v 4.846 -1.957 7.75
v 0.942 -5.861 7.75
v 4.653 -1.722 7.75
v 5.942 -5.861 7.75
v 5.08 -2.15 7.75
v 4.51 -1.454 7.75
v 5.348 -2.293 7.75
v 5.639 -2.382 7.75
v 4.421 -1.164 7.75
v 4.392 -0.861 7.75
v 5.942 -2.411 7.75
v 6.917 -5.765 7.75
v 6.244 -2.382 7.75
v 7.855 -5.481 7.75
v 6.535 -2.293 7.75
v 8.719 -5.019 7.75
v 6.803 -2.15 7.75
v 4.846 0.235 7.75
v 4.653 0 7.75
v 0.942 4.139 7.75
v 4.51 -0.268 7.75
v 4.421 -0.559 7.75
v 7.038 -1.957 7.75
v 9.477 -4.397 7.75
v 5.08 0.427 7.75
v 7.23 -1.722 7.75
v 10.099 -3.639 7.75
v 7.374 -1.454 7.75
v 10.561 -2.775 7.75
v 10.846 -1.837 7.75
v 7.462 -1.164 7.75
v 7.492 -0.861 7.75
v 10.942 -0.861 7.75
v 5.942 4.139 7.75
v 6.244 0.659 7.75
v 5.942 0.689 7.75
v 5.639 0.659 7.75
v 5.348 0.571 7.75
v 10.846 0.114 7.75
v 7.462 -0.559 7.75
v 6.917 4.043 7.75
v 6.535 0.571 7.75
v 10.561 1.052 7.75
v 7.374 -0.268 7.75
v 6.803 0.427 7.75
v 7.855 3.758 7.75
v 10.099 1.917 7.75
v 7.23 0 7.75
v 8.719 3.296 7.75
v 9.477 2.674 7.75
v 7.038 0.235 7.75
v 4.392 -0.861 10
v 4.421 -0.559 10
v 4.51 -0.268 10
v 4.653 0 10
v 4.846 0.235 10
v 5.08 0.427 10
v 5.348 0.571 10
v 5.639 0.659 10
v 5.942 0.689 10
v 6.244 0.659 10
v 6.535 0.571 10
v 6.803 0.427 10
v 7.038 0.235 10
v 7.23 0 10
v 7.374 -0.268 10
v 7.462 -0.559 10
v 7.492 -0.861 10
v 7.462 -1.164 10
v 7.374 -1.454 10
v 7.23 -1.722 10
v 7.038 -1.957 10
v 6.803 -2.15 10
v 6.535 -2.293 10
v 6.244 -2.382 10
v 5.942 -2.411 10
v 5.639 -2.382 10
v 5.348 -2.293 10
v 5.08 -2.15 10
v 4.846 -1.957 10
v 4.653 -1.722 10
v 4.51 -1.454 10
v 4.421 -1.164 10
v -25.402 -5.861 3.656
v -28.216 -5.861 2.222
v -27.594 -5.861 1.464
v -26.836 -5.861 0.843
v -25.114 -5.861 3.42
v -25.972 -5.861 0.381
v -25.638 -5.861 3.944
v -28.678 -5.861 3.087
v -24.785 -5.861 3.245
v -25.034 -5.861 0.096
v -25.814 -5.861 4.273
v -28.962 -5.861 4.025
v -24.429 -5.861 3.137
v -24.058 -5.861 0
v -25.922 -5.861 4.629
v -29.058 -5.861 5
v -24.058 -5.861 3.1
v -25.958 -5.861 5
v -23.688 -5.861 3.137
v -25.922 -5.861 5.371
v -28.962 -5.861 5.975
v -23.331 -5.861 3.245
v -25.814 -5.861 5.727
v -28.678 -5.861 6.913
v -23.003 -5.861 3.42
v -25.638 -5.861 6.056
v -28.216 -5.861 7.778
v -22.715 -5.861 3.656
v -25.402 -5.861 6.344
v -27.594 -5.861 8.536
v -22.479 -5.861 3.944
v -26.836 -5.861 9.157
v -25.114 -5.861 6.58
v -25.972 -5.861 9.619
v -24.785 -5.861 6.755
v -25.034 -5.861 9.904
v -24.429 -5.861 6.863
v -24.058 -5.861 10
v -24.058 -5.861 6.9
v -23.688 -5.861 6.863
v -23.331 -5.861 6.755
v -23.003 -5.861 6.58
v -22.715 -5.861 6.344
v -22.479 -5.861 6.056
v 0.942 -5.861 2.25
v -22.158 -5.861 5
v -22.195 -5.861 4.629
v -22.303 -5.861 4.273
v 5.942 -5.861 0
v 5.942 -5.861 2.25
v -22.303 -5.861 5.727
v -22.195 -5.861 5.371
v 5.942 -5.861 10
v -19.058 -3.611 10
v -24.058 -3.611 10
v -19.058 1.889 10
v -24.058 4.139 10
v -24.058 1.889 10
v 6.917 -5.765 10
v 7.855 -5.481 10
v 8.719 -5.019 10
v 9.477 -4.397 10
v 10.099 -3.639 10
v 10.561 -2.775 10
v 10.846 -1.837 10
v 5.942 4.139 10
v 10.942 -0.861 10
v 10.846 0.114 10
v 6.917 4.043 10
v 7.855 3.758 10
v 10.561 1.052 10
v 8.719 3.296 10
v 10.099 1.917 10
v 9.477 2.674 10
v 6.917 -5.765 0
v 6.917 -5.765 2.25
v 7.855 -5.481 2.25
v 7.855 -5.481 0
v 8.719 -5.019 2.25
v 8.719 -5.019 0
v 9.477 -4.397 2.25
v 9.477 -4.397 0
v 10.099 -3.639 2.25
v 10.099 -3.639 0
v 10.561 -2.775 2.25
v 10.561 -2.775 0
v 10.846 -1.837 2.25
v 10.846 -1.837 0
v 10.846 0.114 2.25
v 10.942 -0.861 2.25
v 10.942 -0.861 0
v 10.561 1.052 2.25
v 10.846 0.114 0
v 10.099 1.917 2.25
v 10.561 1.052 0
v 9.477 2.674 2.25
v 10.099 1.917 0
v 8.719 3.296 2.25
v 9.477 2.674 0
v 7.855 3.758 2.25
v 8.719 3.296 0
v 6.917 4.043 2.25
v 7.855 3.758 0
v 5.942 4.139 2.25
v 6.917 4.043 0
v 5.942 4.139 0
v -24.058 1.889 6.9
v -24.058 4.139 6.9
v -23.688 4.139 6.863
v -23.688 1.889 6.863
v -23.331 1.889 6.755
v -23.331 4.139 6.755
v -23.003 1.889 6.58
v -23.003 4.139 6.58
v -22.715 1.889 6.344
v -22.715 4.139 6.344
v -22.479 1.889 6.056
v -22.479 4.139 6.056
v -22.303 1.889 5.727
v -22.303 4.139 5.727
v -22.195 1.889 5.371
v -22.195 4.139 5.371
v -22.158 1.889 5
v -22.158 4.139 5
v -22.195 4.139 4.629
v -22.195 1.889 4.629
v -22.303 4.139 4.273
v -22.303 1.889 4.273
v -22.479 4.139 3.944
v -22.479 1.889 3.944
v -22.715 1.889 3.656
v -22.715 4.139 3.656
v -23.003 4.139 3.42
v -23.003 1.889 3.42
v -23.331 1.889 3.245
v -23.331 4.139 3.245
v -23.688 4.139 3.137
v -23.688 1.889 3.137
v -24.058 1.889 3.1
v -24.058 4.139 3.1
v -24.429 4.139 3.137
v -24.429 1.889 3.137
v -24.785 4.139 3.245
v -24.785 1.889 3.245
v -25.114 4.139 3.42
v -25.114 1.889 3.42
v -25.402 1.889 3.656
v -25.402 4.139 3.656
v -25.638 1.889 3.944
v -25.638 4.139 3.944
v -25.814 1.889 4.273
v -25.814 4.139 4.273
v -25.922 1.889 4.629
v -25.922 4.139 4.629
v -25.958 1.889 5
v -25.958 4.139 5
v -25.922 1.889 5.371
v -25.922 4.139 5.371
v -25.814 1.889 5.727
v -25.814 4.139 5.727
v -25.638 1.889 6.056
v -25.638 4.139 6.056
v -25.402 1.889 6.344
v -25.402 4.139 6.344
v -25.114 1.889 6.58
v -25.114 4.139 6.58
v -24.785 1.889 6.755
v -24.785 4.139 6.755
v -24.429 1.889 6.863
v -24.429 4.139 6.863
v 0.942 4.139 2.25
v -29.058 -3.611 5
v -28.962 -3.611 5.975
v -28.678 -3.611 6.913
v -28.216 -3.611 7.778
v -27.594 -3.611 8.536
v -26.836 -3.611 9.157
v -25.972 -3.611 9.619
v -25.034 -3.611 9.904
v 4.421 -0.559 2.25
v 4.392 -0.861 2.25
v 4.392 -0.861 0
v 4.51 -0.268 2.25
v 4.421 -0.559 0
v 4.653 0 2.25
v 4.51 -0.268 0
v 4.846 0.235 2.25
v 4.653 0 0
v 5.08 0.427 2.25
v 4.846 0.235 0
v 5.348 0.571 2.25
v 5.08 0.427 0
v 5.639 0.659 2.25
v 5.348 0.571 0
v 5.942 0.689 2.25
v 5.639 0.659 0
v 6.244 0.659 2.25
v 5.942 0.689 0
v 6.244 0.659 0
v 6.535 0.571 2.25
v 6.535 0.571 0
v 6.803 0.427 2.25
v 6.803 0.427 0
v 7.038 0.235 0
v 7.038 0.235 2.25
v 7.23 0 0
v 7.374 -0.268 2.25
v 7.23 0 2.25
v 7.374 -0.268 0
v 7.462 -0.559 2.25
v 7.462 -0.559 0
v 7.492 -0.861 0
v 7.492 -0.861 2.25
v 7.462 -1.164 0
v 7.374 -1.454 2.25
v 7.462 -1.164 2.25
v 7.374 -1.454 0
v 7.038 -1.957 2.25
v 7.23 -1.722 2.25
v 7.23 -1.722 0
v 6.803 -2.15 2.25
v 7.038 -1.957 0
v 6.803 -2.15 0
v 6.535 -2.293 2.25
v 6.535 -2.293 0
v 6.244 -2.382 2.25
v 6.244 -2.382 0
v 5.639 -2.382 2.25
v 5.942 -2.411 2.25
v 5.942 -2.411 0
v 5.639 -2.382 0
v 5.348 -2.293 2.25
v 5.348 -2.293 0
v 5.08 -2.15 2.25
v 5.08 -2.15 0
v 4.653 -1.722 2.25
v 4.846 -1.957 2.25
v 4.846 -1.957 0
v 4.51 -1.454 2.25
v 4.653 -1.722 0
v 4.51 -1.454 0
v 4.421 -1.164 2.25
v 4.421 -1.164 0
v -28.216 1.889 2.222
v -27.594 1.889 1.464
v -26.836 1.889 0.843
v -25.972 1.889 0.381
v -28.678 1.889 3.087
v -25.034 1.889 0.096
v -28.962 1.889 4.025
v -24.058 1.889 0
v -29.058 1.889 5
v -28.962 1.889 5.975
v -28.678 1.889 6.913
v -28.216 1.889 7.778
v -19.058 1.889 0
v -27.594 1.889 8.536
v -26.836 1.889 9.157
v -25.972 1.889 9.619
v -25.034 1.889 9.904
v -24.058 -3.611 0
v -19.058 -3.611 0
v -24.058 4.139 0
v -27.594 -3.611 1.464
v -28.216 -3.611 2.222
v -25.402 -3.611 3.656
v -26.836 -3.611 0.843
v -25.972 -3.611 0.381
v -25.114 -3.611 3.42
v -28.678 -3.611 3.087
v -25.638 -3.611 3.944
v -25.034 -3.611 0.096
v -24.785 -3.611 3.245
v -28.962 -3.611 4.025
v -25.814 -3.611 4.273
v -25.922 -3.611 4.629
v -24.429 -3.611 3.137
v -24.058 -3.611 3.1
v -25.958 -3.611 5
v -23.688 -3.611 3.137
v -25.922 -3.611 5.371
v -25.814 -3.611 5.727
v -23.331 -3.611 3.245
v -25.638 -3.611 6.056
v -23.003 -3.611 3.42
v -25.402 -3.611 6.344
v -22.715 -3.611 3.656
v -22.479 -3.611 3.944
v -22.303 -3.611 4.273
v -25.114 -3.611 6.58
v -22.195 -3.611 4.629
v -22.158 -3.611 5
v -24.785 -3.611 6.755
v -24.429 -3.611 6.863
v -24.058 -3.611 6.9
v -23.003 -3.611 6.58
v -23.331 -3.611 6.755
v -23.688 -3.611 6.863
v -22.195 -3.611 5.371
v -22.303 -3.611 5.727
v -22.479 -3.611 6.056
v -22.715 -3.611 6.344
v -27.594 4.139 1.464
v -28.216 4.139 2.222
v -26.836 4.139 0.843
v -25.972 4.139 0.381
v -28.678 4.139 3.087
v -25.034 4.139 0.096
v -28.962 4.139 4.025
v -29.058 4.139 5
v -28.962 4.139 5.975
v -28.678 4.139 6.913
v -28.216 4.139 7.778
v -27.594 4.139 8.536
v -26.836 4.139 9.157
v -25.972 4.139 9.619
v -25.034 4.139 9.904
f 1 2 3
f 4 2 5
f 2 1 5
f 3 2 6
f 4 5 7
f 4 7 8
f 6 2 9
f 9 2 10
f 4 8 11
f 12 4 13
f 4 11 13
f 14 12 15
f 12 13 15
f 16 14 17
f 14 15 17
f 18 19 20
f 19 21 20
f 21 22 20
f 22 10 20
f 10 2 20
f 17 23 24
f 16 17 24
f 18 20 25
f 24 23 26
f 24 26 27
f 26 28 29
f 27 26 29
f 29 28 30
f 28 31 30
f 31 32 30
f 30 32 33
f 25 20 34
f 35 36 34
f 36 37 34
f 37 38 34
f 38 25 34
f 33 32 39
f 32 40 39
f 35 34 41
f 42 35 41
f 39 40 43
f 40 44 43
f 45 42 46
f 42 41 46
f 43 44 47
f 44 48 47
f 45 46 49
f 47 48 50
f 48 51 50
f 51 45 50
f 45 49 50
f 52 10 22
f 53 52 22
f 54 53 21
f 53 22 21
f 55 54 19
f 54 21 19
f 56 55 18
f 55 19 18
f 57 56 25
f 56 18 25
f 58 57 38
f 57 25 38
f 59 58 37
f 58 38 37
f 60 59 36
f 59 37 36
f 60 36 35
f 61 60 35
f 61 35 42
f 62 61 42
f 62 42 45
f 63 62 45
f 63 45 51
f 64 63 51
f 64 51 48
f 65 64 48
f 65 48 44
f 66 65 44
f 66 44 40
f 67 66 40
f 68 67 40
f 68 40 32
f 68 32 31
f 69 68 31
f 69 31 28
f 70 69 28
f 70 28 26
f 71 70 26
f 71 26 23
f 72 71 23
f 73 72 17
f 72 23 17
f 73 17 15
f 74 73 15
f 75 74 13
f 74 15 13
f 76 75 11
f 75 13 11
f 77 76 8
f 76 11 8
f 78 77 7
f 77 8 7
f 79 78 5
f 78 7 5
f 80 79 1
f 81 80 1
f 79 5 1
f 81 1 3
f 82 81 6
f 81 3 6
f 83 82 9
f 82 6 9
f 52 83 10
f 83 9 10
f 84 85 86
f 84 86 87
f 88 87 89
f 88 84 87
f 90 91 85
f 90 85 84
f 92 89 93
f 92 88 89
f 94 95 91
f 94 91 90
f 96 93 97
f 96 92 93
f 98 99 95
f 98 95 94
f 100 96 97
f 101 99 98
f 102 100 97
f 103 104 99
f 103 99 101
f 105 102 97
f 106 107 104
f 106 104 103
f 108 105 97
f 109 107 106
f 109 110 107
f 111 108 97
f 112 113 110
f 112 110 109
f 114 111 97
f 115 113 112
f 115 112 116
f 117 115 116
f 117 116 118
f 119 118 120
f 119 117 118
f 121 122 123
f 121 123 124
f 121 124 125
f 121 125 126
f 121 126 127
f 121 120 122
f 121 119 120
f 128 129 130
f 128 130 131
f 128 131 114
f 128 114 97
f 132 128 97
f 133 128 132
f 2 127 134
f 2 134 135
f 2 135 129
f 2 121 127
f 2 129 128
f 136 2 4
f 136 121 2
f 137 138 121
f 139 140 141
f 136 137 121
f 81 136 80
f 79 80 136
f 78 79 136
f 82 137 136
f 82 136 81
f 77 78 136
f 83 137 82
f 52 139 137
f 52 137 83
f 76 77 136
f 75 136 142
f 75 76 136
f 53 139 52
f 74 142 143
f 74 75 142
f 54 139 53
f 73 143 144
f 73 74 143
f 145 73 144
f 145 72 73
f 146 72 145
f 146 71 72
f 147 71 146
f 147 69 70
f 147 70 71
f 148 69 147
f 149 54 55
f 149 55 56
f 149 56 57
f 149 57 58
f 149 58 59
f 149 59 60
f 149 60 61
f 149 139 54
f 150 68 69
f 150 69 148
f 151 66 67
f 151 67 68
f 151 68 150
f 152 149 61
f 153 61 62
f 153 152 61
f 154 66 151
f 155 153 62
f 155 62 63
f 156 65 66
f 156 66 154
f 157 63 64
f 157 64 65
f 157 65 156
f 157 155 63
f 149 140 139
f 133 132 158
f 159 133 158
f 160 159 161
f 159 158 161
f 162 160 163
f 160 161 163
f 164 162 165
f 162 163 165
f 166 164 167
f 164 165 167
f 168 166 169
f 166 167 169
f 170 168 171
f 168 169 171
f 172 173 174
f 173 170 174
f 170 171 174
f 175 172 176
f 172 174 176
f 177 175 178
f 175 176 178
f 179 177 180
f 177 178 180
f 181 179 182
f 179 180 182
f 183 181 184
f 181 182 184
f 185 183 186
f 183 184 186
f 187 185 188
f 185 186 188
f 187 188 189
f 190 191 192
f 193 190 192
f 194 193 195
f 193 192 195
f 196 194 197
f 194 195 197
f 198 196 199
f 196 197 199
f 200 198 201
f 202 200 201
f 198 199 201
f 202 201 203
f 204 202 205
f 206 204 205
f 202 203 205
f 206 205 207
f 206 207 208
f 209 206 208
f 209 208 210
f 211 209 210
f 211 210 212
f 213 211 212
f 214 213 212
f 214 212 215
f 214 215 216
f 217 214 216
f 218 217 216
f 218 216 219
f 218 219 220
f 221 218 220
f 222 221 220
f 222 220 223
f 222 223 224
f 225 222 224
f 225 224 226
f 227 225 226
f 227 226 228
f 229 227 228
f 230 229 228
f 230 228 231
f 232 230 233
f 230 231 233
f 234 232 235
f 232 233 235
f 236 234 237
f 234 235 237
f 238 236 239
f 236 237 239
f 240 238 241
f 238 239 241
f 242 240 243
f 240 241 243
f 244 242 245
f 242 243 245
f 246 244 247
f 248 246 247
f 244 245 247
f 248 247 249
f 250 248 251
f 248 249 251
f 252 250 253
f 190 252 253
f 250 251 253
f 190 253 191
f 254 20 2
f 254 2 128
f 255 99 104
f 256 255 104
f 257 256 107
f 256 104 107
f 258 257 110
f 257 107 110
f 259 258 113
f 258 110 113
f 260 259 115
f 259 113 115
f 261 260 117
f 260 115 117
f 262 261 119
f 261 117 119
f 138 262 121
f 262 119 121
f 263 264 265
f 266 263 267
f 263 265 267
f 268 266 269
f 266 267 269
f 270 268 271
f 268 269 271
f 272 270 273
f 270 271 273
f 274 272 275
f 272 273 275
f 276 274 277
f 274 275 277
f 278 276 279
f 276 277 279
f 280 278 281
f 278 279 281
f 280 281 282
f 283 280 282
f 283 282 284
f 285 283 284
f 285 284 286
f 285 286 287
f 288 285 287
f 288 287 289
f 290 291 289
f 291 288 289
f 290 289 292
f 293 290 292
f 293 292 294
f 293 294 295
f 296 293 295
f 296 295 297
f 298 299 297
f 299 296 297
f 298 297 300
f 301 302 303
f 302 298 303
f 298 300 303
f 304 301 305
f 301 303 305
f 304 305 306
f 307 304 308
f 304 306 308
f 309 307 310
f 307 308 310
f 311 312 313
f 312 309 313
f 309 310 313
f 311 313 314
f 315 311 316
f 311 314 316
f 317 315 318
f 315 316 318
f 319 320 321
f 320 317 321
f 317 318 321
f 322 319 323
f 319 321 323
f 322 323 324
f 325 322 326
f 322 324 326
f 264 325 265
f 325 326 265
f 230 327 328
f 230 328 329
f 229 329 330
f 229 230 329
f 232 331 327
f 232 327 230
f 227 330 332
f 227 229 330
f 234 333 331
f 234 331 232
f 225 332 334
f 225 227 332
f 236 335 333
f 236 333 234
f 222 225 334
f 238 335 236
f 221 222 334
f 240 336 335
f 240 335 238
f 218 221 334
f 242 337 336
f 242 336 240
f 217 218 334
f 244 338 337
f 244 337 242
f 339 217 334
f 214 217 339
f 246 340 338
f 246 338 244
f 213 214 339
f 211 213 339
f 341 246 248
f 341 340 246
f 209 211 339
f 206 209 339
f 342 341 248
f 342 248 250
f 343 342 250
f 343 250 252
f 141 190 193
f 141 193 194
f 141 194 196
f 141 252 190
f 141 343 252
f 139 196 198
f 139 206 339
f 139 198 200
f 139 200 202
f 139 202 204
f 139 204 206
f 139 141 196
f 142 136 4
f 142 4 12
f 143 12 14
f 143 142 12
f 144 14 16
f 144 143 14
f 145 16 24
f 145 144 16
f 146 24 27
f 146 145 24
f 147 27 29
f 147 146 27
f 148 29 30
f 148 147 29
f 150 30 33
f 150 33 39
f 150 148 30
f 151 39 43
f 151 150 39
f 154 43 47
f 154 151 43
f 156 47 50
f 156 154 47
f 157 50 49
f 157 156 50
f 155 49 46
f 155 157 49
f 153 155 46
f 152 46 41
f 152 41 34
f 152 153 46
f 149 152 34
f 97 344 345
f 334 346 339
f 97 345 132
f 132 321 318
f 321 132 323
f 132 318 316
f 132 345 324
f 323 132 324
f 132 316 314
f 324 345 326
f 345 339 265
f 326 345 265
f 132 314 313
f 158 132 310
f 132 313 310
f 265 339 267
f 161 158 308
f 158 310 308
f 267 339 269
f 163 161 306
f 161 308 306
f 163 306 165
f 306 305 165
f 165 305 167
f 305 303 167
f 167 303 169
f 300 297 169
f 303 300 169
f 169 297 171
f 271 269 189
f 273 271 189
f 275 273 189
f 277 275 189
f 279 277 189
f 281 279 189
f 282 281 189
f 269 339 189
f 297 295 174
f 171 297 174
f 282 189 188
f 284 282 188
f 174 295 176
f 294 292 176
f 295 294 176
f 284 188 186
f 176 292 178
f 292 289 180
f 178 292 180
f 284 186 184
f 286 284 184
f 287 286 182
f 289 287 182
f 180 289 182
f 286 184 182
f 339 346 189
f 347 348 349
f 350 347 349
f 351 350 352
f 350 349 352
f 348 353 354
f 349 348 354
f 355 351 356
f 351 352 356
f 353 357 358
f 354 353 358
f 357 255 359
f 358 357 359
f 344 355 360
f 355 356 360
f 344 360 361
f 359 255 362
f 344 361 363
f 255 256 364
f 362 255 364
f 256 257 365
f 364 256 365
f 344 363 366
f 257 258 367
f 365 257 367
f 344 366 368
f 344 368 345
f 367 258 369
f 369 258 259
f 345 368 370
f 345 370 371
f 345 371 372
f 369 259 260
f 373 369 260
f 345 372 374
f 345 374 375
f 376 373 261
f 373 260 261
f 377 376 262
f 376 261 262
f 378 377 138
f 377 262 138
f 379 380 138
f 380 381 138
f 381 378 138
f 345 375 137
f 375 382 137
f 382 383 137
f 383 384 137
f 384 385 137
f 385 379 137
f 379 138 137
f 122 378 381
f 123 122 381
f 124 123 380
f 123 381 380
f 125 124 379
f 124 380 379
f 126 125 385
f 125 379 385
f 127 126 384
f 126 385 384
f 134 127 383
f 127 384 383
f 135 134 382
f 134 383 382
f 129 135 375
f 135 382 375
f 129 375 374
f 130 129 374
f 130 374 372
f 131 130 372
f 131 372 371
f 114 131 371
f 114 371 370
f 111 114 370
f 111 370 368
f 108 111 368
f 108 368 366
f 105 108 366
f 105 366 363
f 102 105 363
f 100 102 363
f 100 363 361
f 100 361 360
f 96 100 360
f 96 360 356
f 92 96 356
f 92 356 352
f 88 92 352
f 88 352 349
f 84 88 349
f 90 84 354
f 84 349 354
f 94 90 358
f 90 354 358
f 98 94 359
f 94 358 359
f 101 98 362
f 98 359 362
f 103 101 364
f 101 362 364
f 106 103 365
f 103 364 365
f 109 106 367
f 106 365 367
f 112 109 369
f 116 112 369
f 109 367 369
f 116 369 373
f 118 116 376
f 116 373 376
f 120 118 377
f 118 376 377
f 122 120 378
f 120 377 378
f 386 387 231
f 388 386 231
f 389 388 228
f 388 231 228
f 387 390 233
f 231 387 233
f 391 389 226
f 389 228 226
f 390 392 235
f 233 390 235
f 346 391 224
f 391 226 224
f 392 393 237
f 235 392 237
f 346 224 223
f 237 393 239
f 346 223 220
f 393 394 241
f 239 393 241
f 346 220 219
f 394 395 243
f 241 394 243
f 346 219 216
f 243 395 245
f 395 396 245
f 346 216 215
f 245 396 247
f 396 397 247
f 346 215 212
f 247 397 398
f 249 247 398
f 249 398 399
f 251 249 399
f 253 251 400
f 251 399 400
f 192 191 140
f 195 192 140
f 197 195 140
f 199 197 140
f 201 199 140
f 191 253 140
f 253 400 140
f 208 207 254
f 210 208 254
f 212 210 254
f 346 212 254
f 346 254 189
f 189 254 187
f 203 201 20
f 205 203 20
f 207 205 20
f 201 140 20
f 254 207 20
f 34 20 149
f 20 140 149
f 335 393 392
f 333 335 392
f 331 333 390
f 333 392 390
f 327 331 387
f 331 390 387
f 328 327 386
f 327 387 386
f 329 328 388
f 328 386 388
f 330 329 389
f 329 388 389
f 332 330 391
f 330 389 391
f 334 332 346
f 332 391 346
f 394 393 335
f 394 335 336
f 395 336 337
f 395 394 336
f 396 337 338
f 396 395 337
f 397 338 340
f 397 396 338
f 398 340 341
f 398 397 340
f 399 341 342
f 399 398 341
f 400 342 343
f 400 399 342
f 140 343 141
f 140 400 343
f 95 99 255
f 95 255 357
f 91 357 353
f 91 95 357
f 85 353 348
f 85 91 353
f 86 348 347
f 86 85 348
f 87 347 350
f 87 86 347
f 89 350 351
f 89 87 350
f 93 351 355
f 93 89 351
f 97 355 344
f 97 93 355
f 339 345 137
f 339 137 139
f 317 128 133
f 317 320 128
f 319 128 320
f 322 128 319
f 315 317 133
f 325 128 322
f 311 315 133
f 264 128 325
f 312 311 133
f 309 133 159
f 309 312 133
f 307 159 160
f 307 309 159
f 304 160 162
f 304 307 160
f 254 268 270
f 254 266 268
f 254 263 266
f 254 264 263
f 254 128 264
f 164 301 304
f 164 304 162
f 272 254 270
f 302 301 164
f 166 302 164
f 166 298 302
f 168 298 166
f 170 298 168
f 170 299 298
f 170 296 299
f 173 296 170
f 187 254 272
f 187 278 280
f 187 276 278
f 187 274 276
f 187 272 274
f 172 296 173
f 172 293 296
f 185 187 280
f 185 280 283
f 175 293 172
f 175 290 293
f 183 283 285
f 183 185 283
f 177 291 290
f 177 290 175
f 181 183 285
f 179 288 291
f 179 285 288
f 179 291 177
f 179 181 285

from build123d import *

# Parameters (mm, degrees)
SKETCH1_W            = 30
SKETCH1_H            = 10
BOSS_EXTRUDE1_DEPTH  = 10
SKETCH2_R            = 5
BOSS_EXTRUDE2_DEPTH  = 2.25
BOSS_EXTRUDE4_DEPTH  = 2.25
MIRROR4_COPY_1_DEPTH = 2.25
MIRROR4_COPY_2_DEPTH = 2.25
SKETCH4_R            = 1.9
CUT_EXTRUDE1_DEPTH   = 13.25
SKETCH5_R            = 1.55
CUT_EXTRUDE2_DEPTH   = 13.25
SKETCH6_W            = 5
SKETCH6_H            = 5.5
CUT_EXTRUDE3_DEPTH   = 13.25
SKETCH7_W            = 5
SKETCH7_H            = 5.5
CUT_EXTRUDE4_DEPTH   = 13.25


with BuildPart() as part:
    # Sketch1 → Boss-Extrude1 (new body)
    with BuildSketch(Plane.XY):
        with Locations((-9.058394161, -0.861313869)):
            Rectangle(SKETCH1_W, SKETCH1_H)
    extrude(amount=BOSS_EXTRUDE1_DEPTH)

    # Sketch2 → Boss-Extrude2 (add)
    with BuildSketch(Plane.XY.offset(10)):
        with Locations((5.941605839, -0.861313869)):
            Circle(SKETCH2_R)
    boss_extrude2 = extrude(amount=-BOSS_EXTRUDE2_DEPTH)

    # Sketch3 → Boss-Extrude4 (add)
    with BuildSketch(Plane(origin=(0, 4.138686131, 0), x_dir=(1, 0, 0), z_dir=(0, 1, 0))):
        with BuildLine():
            Line((-24.058394161, -10), (-24.058394161, -5))
            Line((-24.058394161, -5), (-29.058394161, -5))
            ThreePointArc((-29.058394161, -5), (-27.593928067, -8.535533906), (-24.058394161, -10))
        make_face()
    boss_extrude4 = extrude(amount=-BOSS_EXTRUDE4_DEPTH)

    # Mirror1: Boss-Extrude2, Boss-Extrude4 across plane
    add(boss_extrude2.mirror(Plane(origin=(0, 0, 5), x_dir=(1, 0, 0), z_dir=(0, 0, -1))))
    add(boss_extrude4.mirror(Plane(origin=(0, 0, 5), x_dir=(1, 0, 0), z_dir=(0, 0, -1))))

    # Mirror3: Boss-Extrude4 across plane
    add(boss_extrude4.mirror(Plane.ZX.offset(-0.861313869)))

    # Mirror4 copy 1 sketch → Mirror4 copy 1 (add)
    with BuildSketch(Plane(origin=(0, -5.861313869, 10), x_dir=(1, 0, 0), z_dir=(0, -1, 0))):
        with BuildLine():
            Line((-24.058394161, -10), (-24.058394161, -5))
            Line((-24.058394161, -5), (-29.058394161, -5))
            ThreePointArc((-29.058394161, -5), (-27.593928067, -8.535533906), (-24.058394161, -10))
        make_face()
    extrude(amount=-MIRROR4_COPY_1_DEPTH)

    # Mirror4 copy 2 sketch → Mirror4 copy 2 (add)
    with BuildSketch(Plane(origin=(0, 4.138686131, 10), x_dir=(1, 0, 0), z_dir=(0, 1, 0))):
        with BuildLine():
            Line((-24.058394161, 10), (-24.058394161, 5))
            Line((-24.058394161, 5), (-29.058394161, 5))
            ThreePointArc((-29.058394161, 5), (-27.593928067, 8.535533906), (-24.058394161, 10))
        make_face()
    extrude(amount=-MIRROR4_COPY_2_DEPTH)

    # Sketch4 → Cut-Extrude1 (cut)
    with BuildSketch(Plane(origin=(0, 4.138686131, 0), x_dir=(1, 0, 0), z_dir=(0, 1, 0))):
        with Locations(Location((-24.058394161, -5, 0), (0, 0, 270))):  # turned: the seam where the file's is
            Circle(SKETCH4_R)
    extrude(amount=-CUT_EXTRUDE1_DEPTH, mode=Mode.SUBTRACT)

    # Sketch5 → Cut-Extrude2 (cut)
    with BuildSketch(Plane(origin=(0, 0, 0), x_dir=(-1, 0, 0), z_dir=(0, 0, -1))):
        with Locations((-5.941605839, -0.861313869)):
            Circle(SKETCH5_R)
    extrude(amount=-CUT_EXTRUDE2_DEPTH, mode=Mode.SUBTRACT)

    # Sketch6 → Cut-Extrude3 (cut)
    with BuildSketch(Plane(origin=(0, 4.138686131, 0), x_dir=(1, 0, 0), z_dir=(0, 1, 0))):
        with Locations((3.441605839, -5)):
            Rectangle(SKETCH6_W, SKETCH6_H)
    extrude(amount=-CUT_EXTRUDE3_DEPTH, mode=Mode.SUBTRACT)

    # Sketch7 → Cut-Extrude4 (cut)
    with BuildSketch(Plane.XY.offset(10)):
        with Locations((-21.558394161, -0.861313869)):
            Rectangle(SKETCH7_W, SKETCH7_H)
    extrude(amount=-CUT_EXTRUDE4_DEPTH, mode=Mode.SUBTRACT)


solid = part.part
